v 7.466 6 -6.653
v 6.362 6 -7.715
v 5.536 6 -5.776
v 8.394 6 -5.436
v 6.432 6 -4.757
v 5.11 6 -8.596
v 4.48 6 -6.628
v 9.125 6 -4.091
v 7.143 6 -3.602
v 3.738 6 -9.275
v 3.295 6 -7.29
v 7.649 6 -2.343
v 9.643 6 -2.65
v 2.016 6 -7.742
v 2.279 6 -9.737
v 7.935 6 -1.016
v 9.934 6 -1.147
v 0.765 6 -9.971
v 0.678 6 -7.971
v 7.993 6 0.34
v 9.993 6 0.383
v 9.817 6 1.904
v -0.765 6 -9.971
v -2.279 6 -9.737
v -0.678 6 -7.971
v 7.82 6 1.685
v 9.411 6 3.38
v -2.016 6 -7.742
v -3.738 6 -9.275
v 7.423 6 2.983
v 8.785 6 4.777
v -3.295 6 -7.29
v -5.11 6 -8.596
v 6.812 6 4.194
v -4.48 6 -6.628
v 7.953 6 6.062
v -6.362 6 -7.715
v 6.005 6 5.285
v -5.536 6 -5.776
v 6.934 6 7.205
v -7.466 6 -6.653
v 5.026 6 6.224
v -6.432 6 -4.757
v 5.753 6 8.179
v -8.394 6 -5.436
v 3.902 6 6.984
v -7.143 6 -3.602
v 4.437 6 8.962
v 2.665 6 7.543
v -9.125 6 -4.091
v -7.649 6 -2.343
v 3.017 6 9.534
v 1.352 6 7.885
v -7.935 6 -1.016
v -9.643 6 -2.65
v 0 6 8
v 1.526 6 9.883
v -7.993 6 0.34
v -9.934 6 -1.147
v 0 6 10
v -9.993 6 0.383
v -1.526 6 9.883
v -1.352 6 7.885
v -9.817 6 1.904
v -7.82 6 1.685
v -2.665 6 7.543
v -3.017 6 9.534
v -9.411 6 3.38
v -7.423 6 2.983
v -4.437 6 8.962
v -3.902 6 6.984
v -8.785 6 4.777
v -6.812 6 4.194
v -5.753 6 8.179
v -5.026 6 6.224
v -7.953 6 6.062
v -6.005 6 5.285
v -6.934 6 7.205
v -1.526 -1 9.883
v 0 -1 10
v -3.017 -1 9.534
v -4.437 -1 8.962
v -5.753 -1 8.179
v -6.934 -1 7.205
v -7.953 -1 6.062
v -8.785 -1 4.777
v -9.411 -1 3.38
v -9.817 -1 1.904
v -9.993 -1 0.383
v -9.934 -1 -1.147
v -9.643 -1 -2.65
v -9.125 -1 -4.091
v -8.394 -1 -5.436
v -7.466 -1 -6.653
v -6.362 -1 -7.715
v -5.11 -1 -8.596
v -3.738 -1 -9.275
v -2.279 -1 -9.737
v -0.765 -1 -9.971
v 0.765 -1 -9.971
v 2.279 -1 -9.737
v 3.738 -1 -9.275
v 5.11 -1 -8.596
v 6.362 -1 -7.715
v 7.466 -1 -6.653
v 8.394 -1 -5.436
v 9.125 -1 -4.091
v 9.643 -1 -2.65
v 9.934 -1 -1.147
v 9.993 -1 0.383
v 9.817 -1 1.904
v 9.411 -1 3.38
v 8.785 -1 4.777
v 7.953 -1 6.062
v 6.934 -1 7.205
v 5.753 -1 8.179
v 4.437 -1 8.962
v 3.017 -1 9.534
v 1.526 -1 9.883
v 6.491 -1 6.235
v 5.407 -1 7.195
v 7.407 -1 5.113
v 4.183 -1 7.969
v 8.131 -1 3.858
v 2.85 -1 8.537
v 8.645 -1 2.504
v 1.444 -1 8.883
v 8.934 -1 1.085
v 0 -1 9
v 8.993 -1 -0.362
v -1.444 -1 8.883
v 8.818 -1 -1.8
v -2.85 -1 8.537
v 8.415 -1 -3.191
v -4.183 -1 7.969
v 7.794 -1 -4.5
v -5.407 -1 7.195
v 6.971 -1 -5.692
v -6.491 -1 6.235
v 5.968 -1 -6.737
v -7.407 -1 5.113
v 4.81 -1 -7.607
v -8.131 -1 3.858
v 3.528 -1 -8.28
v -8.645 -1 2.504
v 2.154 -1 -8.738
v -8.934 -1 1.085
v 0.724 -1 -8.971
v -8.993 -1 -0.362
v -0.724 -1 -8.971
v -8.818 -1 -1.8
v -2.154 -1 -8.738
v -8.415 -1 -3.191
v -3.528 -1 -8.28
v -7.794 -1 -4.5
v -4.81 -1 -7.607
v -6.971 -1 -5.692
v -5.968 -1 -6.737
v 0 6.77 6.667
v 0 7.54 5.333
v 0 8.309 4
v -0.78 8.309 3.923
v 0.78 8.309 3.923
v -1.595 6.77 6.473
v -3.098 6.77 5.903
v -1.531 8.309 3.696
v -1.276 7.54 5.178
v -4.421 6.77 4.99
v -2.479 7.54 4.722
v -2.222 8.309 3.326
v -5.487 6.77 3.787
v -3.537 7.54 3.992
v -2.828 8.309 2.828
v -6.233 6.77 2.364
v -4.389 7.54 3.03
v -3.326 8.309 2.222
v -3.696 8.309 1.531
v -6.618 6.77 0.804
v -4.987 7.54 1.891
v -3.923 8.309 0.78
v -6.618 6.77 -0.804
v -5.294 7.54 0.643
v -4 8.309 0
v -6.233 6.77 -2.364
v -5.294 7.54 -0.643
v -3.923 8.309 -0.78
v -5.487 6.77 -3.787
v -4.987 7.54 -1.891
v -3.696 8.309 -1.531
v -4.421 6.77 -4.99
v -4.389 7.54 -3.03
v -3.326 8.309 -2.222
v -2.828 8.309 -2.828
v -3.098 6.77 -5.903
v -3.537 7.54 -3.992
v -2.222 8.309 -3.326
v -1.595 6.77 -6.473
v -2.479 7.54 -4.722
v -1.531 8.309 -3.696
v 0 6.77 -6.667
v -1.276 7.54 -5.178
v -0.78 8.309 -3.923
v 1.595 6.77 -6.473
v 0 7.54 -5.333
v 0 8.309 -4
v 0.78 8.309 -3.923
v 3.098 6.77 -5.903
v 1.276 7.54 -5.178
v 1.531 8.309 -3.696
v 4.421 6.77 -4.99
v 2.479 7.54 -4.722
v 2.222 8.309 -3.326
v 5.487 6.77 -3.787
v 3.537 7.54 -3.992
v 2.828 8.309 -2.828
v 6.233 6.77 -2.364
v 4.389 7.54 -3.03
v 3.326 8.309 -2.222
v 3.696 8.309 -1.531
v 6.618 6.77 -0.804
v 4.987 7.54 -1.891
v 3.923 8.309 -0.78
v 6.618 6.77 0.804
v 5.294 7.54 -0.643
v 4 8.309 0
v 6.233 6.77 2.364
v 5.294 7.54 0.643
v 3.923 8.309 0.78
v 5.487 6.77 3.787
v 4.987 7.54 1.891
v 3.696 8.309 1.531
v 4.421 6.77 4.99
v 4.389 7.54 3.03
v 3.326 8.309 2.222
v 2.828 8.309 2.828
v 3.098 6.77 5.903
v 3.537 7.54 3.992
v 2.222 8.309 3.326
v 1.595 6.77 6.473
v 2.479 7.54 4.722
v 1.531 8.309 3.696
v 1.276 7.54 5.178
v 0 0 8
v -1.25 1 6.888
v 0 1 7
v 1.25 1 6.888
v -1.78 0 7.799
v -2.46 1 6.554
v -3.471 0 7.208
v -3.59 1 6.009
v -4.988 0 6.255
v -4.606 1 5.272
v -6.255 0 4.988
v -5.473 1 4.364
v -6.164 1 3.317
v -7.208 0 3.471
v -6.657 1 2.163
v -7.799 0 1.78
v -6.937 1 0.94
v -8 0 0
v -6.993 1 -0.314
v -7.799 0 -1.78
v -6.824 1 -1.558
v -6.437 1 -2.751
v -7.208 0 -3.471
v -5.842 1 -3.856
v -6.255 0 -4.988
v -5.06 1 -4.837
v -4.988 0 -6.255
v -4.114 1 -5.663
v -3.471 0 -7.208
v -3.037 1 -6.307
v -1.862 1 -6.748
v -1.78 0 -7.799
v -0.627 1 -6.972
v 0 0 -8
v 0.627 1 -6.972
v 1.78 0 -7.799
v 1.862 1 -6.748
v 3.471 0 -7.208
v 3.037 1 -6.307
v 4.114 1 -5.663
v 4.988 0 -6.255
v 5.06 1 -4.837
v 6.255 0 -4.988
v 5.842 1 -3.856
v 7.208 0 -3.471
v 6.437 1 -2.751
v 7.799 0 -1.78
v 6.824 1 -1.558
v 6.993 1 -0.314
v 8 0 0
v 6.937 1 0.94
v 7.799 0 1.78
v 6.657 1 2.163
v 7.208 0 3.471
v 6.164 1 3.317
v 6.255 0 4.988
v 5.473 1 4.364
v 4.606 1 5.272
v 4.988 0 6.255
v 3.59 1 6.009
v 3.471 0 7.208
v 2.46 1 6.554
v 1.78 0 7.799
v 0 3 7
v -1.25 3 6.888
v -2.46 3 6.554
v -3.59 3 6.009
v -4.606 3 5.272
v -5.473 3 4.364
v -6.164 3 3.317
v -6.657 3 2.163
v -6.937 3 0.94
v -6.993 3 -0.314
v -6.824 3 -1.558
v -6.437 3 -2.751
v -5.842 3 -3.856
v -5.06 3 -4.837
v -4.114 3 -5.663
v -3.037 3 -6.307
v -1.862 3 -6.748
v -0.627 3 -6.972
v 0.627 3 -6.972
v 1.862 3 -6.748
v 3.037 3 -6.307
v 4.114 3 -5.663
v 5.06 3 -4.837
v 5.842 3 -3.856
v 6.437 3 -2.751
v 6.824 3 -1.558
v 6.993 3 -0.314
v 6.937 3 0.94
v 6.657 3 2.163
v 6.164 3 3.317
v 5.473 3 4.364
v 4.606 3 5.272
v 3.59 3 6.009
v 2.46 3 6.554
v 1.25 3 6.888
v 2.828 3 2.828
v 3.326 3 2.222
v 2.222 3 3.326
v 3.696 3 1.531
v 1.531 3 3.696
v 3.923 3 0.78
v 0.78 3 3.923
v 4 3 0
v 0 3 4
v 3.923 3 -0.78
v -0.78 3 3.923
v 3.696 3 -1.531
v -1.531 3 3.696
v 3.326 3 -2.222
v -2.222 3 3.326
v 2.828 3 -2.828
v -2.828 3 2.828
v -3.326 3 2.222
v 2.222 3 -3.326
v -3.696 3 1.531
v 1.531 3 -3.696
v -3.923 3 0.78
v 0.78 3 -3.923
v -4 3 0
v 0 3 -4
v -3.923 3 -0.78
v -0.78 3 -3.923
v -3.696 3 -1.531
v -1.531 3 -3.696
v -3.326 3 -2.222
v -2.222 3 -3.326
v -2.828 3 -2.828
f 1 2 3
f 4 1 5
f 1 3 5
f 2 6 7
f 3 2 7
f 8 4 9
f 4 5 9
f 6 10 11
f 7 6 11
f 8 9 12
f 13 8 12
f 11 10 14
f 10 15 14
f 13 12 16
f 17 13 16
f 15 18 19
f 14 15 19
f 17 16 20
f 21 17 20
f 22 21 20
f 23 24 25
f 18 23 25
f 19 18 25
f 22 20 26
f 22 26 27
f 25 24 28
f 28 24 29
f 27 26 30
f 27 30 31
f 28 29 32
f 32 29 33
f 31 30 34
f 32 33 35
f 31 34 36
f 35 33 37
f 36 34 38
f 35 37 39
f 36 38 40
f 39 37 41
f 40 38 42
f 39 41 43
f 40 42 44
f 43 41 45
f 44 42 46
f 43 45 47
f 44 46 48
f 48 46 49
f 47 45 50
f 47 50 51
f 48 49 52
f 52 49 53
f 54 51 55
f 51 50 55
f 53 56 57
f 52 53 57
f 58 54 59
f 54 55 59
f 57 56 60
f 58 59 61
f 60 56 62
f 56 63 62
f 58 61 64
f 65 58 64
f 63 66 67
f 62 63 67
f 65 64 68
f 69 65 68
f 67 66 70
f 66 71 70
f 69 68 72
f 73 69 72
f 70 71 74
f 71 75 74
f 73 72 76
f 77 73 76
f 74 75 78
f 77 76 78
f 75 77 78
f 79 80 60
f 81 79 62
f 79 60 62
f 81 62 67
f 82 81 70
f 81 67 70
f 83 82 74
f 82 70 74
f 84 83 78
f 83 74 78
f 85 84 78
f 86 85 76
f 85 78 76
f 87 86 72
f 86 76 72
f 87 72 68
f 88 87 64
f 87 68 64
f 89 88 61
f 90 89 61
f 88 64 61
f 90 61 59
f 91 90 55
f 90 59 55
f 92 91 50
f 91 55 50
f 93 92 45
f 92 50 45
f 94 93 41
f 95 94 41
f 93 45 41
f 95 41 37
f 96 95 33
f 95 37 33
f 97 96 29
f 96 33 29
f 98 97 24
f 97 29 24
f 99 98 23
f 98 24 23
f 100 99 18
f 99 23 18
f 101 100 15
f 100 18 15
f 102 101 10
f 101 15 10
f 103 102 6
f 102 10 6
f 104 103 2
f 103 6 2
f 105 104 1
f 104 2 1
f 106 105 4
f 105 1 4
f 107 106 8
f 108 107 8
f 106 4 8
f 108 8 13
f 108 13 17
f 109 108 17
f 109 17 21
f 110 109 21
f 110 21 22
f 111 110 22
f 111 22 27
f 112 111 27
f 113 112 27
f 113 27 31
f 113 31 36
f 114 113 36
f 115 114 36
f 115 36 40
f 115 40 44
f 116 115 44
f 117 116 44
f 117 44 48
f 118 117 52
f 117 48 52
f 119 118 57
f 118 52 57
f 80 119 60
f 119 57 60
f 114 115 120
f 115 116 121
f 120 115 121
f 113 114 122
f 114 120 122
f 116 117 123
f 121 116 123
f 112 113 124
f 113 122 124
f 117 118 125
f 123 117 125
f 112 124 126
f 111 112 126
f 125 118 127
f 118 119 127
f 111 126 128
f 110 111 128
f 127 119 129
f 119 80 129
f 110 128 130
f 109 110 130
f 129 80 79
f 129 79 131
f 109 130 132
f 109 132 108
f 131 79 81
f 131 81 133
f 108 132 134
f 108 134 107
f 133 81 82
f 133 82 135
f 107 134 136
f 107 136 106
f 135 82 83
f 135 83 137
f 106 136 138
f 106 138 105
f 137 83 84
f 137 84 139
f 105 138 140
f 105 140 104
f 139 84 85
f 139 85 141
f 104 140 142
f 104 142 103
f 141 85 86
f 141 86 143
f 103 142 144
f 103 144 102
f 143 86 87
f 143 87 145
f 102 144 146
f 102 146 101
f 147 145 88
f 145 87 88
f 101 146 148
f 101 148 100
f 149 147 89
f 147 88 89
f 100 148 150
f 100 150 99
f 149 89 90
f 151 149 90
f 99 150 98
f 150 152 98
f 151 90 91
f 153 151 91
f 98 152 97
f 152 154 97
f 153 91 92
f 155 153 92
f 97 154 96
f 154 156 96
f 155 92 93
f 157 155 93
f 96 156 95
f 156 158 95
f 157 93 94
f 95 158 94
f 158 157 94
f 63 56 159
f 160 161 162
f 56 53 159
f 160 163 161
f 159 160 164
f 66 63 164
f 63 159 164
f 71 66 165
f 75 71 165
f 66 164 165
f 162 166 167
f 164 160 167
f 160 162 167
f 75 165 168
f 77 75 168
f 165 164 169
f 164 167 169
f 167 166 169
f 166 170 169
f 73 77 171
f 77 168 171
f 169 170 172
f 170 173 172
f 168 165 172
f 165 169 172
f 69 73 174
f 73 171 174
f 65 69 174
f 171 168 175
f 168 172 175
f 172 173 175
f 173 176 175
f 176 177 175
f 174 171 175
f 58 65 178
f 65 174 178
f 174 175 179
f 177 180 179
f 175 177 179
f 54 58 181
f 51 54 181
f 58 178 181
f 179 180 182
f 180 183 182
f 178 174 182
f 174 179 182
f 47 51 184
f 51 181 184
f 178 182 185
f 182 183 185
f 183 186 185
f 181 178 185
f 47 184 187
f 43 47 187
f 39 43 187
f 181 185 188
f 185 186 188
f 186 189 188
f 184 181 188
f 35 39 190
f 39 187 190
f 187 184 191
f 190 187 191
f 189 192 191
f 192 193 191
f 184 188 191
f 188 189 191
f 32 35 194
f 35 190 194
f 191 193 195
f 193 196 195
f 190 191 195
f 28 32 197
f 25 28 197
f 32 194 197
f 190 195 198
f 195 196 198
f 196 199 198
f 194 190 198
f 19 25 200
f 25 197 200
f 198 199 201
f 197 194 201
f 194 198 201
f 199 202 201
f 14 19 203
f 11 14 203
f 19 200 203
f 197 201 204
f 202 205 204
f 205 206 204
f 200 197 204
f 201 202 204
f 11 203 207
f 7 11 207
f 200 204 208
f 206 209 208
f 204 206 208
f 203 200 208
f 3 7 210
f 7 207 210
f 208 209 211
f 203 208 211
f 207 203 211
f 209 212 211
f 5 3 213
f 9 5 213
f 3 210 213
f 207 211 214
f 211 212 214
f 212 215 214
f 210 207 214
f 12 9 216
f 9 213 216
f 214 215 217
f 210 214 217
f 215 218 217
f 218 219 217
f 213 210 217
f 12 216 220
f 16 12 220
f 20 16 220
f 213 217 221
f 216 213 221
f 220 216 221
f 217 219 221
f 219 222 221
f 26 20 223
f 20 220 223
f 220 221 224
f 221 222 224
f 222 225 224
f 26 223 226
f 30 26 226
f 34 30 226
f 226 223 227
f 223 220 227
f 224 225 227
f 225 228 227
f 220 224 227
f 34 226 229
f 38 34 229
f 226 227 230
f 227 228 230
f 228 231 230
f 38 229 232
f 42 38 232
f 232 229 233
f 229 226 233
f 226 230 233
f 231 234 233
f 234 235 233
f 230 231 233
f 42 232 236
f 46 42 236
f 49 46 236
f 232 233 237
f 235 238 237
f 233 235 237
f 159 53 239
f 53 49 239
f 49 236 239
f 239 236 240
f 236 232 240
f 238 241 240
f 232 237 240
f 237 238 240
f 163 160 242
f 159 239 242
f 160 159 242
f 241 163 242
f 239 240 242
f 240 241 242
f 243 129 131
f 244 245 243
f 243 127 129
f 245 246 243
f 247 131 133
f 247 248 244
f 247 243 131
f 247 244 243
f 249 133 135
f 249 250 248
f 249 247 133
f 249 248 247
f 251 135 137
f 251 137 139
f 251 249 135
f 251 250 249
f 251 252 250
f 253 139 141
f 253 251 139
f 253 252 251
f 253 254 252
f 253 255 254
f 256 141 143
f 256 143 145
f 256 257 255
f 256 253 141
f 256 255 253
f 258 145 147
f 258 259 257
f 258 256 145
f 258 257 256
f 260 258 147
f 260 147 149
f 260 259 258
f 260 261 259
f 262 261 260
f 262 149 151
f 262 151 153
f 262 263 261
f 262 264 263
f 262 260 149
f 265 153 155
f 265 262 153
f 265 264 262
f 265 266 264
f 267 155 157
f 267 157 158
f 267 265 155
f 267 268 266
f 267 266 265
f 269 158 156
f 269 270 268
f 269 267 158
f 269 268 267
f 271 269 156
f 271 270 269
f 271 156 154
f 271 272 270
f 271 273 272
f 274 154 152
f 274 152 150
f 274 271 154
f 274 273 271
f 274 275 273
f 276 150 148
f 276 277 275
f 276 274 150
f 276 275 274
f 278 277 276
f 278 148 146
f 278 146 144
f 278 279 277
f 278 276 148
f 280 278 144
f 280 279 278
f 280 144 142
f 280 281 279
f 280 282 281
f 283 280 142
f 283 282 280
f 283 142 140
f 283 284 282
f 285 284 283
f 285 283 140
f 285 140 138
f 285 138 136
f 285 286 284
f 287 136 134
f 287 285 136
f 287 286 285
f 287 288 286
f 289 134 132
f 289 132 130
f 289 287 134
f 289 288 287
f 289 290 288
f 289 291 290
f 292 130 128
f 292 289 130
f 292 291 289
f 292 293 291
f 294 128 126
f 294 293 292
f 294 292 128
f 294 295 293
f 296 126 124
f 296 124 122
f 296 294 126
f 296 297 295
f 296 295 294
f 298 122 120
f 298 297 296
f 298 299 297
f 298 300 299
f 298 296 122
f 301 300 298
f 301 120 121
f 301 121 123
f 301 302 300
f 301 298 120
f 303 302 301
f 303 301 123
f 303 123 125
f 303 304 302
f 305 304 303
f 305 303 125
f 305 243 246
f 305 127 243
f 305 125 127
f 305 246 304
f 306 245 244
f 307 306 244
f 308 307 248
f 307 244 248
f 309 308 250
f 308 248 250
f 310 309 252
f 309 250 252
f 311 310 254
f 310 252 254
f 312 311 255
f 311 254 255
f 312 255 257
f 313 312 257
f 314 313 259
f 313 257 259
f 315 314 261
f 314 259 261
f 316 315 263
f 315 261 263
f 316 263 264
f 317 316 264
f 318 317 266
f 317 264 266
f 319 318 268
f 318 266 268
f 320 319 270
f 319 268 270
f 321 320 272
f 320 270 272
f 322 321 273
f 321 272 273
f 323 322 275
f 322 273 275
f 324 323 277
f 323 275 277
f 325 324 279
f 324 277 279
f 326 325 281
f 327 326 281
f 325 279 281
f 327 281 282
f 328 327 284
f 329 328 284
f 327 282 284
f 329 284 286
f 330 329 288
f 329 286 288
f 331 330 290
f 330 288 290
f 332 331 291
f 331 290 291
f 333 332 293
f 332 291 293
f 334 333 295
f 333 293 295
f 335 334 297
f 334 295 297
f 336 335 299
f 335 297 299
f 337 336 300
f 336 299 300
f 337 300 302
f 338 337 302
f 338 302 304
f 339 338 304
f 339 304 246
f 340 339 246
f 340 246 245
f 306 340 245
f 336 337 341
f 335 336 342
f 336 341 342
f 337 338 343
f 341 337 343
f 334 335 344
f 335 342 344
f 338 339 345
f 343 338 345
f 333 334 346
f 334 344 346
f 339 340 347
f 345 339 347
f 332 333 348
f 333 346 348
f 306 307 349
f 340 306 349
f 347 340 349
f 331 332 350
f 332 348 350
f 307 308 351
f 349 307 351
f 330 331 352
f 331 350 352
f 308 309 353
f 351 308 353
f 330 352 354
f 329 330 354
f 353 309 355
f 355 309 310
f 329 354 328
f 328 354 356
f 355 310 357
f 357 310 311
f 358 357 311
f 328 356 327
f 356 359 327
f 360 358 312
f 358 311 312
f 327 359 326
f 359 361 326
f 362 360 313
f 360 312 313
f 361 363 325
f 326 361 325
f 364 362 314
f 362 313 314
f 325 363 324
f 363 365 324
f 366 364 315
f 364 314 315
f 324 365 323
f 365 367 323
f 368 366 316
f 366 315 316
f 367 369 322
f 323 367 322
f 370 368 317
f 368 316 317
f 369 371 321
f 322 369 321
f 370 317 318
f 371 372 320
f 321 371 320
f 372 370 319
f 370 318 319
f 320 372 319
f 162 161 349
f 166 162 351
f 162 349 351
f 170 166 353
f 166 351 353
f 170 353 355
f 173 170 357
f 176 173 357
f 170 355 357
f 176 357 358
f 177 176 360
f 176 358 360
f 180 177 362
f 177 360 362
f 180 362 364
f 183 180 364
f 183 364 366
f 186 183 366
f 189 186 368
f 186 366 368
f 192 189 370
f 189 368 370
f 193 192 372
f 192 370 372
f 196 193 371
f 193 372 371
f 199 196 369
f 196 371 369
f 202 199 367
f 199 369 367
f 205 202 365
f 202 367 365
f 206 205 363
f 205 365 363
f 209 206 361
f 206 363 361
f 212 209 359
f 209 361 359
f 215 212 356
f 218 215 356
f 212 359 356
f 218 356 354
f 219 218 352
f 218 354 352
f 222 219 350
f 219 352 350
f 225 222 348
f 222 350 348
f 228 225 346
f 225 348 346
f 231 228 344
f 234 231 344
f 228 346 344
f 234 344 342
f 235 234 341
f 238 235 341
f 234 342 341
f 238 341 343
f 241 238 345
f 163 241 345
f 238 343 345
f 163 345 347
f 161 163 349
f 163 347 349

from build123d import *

# Parameters (mm, degrees)
CHAMFER6_SIZE   = 4
CHAMFER6_SIZE_2 = 6.92820323
CHAMFER4_SIZE   = 2


with BuildPart() as part:
    # Sketch3 → Revolve2 (revolve)
    with BuildSketch(Plane.XY, mode=Mode.PRIVATE) as revolve2_sk:
        Polygon((8, 6), (8, 10), (4, 10), (4, 6), (4, 3), (7, 3), (7, 1), (7, -1), (10, -1), (10, 6), align=None)
    revolve(revolve2_sk.sketch.rotate(Axis((0, 50.624065585, 0), (0, -1, 0)), 90), axis=Axis((0, 50.624065585, 0), (0, -1, 0)))

    # Chamfer6
    # the kernel refuses this chamfer: 6.92820323, 4 mm, written as the material it takes off along each edge
    with BuildSketch(Plane(origin=(0, 10, 0), x_dir=(0, 0, 1), z_dir=(1, 0, 0))) as chamfer6_piece_1_section:
        Polygon((8, CHAMFER6_SIZE), (8 - CHAMFER6_SIZE_2, 0), (8, 0), align=None)
    chamfer6_piece_1 = revolve(axis=Axis((0, 10, 0), (0, -1, 0)), mode=Mode.PRIVATE)
    chamfer6_piece_1 = split(chamfer6_piece_1, bisect_by=Plane(origin=(0, 6, -4.457093256), z_dir=(0, 1, 0)), keep=Keep.TOP, mode=Mode.PRIVATE)
    add(chamfer6_piece_1, mode=Mode.SUBTRACT)

    # Chamfer4
    chamfer4_edges = [part.edges().sort_by_distance(p)[0] for p in [
        (0, -1, -7),
    ]]
    chamfer(chamfer4_edges, length=CHAMFER4_SIZE)


solid = part.part
